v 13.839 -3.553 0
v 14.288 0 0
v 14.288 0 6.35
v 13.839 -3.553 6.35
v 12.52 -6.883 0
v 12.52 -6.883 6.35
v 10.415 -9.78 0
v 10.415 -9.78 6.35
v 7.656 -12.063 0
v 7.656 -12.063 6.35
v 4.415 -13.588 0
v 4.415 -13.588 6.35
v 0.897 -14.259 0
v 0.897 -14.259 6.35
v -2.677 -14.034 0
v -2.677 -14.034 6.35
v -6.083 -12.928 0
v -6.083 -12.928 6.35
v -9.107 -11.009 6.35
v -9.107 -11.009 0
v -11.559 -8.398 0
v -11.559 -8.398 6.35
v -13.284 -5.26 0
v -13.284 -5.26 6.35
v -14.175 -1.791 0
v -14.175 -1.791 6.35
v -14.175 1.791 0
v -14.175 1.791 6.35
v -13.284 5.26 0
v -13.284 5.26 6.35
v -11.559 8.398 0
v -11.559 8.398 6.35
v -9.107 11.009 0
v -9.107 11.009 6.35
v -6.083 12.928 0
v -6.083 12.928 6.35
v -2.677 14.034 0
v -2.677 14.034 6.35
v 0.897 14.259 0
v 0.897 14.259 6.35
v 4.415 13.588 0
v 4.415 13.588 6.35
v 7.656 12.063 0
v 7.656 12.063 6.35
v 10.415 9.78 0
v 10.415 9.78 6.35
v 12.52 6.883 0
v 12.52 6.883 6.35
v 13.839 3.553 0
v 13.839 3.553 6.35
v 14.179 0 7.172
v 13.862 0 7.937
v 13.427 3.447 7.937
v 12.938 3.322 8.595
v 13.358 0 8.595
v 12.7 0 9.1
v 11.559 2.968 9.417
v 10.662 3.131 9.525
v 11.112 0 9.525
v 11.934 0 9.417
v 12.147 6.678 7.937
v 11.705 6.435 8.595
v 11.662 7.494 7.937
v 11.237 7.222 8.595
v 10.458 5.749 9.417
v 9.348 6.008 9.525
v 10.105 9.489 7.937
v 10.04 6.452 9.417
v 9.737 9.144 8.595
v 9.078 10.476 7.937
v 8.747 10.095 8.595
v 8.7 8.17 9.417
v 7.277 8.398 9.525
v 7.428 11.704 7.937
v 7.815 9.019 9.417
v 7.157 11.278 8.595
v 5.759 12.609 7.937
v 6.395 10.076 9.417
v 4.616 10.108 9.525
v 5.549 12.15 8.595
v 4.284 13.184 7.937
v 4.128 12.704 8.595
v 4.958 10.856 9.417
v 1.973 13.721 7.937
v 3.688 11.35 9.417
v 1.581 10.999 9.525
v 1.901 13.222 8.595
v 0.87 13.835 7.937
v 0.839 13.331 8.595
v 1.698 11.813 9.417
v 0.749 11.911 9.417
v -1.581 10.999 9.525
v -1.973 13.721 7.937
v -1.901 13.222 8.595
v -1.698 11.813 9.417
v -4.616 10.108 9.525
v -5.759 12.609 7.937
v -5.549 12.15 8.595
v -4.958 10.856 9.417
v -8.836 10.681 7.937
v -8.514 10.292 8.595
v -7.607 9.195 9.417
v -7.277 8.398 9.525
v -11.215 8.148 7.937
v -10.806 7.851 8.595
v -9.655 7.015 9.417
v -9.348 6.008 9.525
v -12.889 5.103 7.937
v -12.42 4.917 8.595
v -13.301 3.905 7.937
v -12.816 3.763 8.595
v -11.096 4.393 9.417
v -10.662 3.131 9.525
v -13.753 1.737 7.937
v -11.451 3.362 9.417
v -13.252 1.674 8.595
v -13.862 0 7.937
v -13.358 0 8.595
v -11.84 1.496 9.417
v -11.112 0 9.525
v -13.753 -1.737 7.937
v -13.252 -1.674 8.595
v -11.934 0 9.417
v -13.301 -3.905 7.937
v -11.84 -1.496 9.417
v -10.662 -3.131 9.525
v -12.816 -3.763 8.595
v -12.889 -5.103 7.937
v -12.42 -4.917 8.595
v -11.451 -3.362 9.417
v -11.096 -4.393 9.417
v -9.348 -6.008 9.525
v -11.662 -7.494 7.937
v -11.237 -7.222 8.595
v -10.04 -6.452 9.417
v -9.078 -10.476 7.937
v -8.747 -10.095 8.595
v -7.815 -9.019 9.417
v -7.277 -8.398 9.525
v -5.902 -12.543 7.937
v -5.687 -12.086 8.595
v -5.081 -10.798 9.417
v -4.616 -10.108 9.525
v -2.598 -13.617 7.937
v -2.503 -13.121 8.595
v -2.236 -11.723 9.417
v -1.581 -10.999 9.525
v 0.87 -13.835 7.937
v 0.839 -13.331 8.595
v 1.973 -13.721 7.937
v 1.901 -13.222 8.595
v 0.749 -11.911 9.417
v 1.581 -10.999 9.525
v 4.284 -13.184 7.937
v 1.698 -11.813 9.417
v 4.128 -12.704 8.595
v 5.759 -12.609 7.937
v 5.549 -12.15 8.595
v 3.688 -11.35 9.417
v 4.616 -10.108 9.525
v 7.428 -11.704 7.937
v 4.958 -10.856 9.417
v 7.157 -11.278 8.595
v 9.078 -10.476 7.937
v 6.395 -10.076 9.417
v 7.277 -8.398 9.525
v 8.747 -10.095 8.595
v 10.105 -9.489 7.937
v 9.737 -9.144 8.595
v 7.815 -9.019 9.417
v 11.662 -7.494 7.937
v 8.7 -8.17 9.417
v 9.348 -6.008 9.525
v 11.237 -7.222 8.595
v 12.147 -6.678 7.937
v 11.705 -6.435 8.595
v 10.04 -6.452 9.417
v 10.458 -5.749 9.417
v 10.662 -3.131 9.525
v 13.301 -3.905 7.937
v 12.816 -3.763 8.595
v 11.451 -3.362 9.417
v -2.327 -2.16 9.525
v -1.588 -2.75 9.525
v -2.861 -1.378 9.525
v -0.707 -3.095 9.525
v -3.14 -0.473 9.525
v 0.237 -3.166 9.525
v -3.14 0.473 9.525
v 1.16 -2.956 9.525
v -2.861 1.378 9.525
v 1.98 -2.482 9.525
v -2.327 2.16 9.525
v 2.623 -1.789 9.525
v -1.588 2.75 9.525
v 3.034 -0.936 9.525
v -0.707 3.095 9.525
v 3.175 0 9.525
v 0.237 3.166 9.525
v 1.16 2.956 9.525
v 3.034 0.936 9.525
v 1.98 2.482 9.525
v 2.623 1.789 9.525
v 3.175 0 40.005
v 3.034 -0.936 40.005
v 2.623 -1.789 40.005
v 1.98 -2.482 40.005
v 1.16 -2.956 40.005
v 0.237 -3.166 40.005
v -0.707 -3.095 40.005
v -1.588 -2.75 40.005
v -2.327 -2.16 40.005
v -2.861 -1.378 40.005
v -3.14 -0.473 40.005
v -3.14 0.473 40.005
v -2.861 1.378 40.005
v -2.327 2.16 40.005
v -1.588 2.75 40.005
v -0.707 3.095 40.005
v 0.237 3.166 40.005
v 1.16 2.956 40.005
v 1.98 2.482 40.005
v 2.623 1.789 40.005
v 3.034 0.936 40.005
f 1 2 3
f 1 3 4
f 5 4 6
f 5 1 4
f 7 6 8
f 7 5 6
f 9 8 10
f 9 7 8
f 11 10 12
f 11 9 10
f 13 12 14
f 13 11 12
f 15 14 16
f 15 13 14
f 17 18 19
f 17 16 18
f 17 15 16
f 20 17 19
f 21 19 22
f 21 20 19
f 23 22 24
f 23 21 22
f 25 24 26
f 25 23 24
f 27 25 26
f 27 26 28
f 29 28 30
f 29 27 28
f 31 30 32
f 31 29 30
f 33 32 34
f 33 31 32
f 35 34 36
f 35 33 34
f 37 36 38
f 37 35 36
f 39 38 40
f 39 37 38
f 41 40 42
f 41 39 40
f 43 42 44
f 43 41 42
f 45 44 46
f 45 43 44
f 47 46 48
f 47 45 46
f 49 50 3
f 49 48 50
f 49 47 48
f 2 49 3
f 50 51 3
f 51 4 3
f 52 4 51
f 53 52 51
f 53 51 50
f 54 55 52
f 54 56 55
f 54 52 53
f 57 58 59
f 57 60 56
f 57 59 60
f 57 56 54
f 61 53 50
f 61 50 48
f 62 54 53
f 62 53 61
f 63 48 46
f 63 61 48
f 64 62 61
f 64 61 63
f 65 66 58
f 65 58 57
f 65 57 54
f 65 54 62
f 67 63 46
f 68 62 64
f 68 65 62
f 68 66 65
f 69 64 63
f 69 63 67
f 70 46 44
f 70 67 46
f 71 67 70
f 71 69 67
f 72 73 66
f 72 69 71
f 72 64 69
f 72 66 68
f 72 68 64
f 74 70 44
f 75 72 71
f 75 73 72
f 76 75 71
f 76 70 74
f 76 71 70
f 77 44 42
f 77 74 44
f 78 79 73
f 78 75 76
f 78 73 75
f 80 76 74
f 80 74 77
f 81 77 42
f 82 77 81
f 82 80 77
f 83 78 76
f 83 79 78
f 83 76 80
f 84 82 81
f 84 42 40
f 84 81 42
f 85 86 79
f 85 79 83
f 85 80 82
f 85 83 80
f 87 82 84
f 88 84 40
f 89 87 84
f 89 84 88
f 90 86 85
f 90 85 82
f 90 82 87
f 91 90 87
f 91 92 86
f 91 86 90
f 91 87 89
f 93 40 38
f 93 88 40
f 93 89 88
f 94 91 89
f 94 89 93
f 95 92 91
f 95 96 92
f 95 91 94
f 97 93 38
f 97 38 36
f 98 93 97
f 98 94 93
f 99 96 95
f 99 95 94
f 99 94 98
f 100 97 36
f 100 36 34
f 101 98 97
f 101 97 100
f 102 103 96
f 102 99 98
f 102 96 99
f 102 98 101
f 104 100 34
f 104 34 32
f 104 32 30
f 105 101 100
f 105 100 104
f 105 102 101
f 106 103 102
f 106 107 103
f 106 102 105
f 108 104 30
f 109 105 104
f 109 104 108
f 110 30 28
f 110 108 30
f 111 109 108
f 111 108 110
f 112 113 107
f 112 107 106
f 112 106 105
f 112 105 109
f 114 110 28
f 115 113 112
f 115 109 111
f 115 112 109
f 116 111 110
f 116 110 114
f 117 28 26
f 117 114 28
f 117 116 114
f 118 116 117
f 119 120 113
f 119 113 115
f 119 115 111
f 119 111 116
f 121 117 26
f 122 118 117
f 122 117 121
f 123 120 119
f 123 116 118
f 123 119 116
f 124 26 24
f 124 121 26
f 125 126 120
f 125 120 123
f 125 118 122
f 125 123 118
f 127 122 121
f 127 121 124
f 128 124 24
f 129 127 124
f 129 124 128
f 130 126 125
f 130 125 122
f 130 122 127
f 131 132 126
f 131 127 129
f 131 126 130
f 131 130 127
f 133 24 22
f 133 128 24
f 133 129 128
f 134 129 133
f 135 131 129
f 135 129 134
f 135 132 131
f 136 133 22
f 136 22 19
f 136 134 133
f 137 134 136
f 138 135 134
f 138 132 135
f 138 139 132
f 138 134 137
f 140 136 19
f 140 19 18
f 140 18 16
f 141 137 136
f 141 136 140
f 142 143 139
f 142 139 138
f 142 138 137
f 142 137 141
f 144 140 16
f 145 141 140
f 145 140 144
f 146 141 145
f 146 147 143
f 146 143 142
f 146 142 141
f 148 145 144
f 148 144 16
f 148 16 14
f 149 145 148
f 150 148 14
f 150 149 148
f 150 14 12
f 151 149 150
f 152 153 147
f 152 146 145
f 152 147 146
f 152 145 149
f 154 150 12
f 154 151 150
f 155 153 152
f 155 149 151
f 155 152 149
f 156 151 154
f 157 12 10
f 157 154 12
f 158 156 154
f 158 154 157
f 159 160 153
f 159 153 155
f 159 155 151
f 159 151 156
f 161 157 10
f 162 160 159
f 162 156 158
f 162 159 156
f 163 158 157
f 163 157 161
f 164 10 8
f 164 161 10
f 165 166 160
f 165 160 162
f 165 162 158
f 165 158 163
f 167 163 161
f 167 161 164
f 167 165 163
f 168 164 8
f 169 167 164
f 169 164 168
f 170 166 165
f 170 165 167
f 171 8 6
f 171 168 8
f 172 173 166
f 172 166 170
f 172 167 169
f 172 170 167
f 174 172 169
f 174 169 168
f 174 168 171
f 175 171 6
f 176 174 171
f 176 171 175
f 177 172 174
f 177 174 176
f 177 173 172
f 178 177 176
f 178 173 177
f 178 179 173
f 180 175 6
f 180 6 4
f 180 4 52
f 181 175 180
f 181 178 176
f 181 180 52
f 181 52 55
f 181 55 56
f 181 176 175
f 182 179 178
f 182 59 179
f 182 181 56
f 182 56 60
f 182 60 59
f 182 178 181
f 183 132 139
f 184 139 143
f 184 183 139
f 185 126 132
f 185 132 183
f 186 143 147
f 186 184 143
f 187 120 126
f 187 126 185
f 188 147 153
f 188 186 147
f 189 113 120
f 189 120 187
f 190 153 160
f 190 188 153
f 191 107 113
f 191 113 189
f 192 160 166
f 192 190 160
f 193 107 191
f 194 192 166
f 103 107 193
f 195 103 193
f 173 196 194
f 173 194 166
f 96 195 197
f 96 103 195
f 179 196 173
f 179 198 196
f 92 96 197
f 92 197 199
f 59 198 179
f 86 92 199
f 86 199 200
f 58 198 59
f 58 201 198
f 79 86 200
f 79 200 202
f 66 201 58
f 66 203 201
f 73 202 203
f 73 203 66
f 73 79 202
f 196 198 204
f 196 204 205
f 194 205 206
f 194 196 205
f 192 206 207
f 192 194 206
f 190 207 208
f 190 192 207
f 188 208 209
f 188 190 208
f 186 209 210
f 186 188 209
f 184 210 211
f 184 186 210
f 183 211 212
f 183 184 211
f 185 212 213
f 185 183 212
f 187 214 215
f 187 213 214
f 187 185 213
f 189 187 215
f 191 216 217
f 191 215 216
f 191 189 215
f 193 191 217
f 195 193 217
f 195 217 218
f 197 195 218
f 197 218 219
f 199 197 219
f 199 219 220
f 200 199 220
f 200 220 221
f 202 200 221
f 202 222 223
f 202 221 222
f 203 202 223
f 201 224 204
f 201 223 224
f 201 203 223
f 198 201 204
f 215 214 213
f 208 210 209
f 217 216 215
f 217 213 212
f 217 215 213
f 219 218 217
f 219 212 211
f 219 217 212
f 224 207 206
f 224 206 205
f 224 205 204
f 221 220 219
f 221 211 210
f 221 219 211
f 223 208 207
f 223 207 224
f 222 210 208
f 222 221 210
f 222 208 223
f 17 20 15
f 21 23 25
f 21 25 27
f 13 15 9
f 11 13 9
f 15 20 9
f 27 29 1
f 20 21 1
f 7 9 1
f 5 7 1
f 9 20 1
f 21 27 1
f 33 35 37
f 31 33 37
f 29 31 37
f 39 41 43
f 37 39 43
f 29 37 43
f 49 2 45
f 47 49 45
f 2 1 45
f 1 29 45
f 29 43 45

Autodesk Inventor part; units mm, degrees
ref_plane "YZ Plane" through (0, 0, 0) normal (1, 0, 0) x (0, 1, 0)
ref_plane "XZ Plane" through (0, 0, 0) normal (0, 1, 0) x (-1, 0, 0)
ref_plane "XY Plane" through (0, 0, 0) normal (0, 0, 1) x (1, 0, 0)
sketch "Sketch1" plane through (0, 0, 0) normal (0, 0, 1) x (1, 0, 0)
  circle A0 centre (0, 0) radius 14.2875
  dimension "d0" = 28.575
extrude "Extrusion1" add sketch "Sketch1" along normal blind 9.525
sketch "Sketch2" plane through (0, 0, 9.525) normal (0, 0, 1) x (1, 0, 0)
  circle A0 centre (0, 0) radius 14.2875 projected
  circle A1 centre (0, 0) radius 3.175
  dimension "d3" = 6.35
extrude "Extrusion2" add sketch "Sketch2" along normal blind 30.48 contours A1
thread "Thread1" size "1/4-20 UNC" class "2A" standard "ANSI Unified Screw Threads" full length
fillet "Fillet1" radius 3.175 1 edges at (-14.2875, 0, 9.525)
properties part number "23015T81_leveling_feet"
